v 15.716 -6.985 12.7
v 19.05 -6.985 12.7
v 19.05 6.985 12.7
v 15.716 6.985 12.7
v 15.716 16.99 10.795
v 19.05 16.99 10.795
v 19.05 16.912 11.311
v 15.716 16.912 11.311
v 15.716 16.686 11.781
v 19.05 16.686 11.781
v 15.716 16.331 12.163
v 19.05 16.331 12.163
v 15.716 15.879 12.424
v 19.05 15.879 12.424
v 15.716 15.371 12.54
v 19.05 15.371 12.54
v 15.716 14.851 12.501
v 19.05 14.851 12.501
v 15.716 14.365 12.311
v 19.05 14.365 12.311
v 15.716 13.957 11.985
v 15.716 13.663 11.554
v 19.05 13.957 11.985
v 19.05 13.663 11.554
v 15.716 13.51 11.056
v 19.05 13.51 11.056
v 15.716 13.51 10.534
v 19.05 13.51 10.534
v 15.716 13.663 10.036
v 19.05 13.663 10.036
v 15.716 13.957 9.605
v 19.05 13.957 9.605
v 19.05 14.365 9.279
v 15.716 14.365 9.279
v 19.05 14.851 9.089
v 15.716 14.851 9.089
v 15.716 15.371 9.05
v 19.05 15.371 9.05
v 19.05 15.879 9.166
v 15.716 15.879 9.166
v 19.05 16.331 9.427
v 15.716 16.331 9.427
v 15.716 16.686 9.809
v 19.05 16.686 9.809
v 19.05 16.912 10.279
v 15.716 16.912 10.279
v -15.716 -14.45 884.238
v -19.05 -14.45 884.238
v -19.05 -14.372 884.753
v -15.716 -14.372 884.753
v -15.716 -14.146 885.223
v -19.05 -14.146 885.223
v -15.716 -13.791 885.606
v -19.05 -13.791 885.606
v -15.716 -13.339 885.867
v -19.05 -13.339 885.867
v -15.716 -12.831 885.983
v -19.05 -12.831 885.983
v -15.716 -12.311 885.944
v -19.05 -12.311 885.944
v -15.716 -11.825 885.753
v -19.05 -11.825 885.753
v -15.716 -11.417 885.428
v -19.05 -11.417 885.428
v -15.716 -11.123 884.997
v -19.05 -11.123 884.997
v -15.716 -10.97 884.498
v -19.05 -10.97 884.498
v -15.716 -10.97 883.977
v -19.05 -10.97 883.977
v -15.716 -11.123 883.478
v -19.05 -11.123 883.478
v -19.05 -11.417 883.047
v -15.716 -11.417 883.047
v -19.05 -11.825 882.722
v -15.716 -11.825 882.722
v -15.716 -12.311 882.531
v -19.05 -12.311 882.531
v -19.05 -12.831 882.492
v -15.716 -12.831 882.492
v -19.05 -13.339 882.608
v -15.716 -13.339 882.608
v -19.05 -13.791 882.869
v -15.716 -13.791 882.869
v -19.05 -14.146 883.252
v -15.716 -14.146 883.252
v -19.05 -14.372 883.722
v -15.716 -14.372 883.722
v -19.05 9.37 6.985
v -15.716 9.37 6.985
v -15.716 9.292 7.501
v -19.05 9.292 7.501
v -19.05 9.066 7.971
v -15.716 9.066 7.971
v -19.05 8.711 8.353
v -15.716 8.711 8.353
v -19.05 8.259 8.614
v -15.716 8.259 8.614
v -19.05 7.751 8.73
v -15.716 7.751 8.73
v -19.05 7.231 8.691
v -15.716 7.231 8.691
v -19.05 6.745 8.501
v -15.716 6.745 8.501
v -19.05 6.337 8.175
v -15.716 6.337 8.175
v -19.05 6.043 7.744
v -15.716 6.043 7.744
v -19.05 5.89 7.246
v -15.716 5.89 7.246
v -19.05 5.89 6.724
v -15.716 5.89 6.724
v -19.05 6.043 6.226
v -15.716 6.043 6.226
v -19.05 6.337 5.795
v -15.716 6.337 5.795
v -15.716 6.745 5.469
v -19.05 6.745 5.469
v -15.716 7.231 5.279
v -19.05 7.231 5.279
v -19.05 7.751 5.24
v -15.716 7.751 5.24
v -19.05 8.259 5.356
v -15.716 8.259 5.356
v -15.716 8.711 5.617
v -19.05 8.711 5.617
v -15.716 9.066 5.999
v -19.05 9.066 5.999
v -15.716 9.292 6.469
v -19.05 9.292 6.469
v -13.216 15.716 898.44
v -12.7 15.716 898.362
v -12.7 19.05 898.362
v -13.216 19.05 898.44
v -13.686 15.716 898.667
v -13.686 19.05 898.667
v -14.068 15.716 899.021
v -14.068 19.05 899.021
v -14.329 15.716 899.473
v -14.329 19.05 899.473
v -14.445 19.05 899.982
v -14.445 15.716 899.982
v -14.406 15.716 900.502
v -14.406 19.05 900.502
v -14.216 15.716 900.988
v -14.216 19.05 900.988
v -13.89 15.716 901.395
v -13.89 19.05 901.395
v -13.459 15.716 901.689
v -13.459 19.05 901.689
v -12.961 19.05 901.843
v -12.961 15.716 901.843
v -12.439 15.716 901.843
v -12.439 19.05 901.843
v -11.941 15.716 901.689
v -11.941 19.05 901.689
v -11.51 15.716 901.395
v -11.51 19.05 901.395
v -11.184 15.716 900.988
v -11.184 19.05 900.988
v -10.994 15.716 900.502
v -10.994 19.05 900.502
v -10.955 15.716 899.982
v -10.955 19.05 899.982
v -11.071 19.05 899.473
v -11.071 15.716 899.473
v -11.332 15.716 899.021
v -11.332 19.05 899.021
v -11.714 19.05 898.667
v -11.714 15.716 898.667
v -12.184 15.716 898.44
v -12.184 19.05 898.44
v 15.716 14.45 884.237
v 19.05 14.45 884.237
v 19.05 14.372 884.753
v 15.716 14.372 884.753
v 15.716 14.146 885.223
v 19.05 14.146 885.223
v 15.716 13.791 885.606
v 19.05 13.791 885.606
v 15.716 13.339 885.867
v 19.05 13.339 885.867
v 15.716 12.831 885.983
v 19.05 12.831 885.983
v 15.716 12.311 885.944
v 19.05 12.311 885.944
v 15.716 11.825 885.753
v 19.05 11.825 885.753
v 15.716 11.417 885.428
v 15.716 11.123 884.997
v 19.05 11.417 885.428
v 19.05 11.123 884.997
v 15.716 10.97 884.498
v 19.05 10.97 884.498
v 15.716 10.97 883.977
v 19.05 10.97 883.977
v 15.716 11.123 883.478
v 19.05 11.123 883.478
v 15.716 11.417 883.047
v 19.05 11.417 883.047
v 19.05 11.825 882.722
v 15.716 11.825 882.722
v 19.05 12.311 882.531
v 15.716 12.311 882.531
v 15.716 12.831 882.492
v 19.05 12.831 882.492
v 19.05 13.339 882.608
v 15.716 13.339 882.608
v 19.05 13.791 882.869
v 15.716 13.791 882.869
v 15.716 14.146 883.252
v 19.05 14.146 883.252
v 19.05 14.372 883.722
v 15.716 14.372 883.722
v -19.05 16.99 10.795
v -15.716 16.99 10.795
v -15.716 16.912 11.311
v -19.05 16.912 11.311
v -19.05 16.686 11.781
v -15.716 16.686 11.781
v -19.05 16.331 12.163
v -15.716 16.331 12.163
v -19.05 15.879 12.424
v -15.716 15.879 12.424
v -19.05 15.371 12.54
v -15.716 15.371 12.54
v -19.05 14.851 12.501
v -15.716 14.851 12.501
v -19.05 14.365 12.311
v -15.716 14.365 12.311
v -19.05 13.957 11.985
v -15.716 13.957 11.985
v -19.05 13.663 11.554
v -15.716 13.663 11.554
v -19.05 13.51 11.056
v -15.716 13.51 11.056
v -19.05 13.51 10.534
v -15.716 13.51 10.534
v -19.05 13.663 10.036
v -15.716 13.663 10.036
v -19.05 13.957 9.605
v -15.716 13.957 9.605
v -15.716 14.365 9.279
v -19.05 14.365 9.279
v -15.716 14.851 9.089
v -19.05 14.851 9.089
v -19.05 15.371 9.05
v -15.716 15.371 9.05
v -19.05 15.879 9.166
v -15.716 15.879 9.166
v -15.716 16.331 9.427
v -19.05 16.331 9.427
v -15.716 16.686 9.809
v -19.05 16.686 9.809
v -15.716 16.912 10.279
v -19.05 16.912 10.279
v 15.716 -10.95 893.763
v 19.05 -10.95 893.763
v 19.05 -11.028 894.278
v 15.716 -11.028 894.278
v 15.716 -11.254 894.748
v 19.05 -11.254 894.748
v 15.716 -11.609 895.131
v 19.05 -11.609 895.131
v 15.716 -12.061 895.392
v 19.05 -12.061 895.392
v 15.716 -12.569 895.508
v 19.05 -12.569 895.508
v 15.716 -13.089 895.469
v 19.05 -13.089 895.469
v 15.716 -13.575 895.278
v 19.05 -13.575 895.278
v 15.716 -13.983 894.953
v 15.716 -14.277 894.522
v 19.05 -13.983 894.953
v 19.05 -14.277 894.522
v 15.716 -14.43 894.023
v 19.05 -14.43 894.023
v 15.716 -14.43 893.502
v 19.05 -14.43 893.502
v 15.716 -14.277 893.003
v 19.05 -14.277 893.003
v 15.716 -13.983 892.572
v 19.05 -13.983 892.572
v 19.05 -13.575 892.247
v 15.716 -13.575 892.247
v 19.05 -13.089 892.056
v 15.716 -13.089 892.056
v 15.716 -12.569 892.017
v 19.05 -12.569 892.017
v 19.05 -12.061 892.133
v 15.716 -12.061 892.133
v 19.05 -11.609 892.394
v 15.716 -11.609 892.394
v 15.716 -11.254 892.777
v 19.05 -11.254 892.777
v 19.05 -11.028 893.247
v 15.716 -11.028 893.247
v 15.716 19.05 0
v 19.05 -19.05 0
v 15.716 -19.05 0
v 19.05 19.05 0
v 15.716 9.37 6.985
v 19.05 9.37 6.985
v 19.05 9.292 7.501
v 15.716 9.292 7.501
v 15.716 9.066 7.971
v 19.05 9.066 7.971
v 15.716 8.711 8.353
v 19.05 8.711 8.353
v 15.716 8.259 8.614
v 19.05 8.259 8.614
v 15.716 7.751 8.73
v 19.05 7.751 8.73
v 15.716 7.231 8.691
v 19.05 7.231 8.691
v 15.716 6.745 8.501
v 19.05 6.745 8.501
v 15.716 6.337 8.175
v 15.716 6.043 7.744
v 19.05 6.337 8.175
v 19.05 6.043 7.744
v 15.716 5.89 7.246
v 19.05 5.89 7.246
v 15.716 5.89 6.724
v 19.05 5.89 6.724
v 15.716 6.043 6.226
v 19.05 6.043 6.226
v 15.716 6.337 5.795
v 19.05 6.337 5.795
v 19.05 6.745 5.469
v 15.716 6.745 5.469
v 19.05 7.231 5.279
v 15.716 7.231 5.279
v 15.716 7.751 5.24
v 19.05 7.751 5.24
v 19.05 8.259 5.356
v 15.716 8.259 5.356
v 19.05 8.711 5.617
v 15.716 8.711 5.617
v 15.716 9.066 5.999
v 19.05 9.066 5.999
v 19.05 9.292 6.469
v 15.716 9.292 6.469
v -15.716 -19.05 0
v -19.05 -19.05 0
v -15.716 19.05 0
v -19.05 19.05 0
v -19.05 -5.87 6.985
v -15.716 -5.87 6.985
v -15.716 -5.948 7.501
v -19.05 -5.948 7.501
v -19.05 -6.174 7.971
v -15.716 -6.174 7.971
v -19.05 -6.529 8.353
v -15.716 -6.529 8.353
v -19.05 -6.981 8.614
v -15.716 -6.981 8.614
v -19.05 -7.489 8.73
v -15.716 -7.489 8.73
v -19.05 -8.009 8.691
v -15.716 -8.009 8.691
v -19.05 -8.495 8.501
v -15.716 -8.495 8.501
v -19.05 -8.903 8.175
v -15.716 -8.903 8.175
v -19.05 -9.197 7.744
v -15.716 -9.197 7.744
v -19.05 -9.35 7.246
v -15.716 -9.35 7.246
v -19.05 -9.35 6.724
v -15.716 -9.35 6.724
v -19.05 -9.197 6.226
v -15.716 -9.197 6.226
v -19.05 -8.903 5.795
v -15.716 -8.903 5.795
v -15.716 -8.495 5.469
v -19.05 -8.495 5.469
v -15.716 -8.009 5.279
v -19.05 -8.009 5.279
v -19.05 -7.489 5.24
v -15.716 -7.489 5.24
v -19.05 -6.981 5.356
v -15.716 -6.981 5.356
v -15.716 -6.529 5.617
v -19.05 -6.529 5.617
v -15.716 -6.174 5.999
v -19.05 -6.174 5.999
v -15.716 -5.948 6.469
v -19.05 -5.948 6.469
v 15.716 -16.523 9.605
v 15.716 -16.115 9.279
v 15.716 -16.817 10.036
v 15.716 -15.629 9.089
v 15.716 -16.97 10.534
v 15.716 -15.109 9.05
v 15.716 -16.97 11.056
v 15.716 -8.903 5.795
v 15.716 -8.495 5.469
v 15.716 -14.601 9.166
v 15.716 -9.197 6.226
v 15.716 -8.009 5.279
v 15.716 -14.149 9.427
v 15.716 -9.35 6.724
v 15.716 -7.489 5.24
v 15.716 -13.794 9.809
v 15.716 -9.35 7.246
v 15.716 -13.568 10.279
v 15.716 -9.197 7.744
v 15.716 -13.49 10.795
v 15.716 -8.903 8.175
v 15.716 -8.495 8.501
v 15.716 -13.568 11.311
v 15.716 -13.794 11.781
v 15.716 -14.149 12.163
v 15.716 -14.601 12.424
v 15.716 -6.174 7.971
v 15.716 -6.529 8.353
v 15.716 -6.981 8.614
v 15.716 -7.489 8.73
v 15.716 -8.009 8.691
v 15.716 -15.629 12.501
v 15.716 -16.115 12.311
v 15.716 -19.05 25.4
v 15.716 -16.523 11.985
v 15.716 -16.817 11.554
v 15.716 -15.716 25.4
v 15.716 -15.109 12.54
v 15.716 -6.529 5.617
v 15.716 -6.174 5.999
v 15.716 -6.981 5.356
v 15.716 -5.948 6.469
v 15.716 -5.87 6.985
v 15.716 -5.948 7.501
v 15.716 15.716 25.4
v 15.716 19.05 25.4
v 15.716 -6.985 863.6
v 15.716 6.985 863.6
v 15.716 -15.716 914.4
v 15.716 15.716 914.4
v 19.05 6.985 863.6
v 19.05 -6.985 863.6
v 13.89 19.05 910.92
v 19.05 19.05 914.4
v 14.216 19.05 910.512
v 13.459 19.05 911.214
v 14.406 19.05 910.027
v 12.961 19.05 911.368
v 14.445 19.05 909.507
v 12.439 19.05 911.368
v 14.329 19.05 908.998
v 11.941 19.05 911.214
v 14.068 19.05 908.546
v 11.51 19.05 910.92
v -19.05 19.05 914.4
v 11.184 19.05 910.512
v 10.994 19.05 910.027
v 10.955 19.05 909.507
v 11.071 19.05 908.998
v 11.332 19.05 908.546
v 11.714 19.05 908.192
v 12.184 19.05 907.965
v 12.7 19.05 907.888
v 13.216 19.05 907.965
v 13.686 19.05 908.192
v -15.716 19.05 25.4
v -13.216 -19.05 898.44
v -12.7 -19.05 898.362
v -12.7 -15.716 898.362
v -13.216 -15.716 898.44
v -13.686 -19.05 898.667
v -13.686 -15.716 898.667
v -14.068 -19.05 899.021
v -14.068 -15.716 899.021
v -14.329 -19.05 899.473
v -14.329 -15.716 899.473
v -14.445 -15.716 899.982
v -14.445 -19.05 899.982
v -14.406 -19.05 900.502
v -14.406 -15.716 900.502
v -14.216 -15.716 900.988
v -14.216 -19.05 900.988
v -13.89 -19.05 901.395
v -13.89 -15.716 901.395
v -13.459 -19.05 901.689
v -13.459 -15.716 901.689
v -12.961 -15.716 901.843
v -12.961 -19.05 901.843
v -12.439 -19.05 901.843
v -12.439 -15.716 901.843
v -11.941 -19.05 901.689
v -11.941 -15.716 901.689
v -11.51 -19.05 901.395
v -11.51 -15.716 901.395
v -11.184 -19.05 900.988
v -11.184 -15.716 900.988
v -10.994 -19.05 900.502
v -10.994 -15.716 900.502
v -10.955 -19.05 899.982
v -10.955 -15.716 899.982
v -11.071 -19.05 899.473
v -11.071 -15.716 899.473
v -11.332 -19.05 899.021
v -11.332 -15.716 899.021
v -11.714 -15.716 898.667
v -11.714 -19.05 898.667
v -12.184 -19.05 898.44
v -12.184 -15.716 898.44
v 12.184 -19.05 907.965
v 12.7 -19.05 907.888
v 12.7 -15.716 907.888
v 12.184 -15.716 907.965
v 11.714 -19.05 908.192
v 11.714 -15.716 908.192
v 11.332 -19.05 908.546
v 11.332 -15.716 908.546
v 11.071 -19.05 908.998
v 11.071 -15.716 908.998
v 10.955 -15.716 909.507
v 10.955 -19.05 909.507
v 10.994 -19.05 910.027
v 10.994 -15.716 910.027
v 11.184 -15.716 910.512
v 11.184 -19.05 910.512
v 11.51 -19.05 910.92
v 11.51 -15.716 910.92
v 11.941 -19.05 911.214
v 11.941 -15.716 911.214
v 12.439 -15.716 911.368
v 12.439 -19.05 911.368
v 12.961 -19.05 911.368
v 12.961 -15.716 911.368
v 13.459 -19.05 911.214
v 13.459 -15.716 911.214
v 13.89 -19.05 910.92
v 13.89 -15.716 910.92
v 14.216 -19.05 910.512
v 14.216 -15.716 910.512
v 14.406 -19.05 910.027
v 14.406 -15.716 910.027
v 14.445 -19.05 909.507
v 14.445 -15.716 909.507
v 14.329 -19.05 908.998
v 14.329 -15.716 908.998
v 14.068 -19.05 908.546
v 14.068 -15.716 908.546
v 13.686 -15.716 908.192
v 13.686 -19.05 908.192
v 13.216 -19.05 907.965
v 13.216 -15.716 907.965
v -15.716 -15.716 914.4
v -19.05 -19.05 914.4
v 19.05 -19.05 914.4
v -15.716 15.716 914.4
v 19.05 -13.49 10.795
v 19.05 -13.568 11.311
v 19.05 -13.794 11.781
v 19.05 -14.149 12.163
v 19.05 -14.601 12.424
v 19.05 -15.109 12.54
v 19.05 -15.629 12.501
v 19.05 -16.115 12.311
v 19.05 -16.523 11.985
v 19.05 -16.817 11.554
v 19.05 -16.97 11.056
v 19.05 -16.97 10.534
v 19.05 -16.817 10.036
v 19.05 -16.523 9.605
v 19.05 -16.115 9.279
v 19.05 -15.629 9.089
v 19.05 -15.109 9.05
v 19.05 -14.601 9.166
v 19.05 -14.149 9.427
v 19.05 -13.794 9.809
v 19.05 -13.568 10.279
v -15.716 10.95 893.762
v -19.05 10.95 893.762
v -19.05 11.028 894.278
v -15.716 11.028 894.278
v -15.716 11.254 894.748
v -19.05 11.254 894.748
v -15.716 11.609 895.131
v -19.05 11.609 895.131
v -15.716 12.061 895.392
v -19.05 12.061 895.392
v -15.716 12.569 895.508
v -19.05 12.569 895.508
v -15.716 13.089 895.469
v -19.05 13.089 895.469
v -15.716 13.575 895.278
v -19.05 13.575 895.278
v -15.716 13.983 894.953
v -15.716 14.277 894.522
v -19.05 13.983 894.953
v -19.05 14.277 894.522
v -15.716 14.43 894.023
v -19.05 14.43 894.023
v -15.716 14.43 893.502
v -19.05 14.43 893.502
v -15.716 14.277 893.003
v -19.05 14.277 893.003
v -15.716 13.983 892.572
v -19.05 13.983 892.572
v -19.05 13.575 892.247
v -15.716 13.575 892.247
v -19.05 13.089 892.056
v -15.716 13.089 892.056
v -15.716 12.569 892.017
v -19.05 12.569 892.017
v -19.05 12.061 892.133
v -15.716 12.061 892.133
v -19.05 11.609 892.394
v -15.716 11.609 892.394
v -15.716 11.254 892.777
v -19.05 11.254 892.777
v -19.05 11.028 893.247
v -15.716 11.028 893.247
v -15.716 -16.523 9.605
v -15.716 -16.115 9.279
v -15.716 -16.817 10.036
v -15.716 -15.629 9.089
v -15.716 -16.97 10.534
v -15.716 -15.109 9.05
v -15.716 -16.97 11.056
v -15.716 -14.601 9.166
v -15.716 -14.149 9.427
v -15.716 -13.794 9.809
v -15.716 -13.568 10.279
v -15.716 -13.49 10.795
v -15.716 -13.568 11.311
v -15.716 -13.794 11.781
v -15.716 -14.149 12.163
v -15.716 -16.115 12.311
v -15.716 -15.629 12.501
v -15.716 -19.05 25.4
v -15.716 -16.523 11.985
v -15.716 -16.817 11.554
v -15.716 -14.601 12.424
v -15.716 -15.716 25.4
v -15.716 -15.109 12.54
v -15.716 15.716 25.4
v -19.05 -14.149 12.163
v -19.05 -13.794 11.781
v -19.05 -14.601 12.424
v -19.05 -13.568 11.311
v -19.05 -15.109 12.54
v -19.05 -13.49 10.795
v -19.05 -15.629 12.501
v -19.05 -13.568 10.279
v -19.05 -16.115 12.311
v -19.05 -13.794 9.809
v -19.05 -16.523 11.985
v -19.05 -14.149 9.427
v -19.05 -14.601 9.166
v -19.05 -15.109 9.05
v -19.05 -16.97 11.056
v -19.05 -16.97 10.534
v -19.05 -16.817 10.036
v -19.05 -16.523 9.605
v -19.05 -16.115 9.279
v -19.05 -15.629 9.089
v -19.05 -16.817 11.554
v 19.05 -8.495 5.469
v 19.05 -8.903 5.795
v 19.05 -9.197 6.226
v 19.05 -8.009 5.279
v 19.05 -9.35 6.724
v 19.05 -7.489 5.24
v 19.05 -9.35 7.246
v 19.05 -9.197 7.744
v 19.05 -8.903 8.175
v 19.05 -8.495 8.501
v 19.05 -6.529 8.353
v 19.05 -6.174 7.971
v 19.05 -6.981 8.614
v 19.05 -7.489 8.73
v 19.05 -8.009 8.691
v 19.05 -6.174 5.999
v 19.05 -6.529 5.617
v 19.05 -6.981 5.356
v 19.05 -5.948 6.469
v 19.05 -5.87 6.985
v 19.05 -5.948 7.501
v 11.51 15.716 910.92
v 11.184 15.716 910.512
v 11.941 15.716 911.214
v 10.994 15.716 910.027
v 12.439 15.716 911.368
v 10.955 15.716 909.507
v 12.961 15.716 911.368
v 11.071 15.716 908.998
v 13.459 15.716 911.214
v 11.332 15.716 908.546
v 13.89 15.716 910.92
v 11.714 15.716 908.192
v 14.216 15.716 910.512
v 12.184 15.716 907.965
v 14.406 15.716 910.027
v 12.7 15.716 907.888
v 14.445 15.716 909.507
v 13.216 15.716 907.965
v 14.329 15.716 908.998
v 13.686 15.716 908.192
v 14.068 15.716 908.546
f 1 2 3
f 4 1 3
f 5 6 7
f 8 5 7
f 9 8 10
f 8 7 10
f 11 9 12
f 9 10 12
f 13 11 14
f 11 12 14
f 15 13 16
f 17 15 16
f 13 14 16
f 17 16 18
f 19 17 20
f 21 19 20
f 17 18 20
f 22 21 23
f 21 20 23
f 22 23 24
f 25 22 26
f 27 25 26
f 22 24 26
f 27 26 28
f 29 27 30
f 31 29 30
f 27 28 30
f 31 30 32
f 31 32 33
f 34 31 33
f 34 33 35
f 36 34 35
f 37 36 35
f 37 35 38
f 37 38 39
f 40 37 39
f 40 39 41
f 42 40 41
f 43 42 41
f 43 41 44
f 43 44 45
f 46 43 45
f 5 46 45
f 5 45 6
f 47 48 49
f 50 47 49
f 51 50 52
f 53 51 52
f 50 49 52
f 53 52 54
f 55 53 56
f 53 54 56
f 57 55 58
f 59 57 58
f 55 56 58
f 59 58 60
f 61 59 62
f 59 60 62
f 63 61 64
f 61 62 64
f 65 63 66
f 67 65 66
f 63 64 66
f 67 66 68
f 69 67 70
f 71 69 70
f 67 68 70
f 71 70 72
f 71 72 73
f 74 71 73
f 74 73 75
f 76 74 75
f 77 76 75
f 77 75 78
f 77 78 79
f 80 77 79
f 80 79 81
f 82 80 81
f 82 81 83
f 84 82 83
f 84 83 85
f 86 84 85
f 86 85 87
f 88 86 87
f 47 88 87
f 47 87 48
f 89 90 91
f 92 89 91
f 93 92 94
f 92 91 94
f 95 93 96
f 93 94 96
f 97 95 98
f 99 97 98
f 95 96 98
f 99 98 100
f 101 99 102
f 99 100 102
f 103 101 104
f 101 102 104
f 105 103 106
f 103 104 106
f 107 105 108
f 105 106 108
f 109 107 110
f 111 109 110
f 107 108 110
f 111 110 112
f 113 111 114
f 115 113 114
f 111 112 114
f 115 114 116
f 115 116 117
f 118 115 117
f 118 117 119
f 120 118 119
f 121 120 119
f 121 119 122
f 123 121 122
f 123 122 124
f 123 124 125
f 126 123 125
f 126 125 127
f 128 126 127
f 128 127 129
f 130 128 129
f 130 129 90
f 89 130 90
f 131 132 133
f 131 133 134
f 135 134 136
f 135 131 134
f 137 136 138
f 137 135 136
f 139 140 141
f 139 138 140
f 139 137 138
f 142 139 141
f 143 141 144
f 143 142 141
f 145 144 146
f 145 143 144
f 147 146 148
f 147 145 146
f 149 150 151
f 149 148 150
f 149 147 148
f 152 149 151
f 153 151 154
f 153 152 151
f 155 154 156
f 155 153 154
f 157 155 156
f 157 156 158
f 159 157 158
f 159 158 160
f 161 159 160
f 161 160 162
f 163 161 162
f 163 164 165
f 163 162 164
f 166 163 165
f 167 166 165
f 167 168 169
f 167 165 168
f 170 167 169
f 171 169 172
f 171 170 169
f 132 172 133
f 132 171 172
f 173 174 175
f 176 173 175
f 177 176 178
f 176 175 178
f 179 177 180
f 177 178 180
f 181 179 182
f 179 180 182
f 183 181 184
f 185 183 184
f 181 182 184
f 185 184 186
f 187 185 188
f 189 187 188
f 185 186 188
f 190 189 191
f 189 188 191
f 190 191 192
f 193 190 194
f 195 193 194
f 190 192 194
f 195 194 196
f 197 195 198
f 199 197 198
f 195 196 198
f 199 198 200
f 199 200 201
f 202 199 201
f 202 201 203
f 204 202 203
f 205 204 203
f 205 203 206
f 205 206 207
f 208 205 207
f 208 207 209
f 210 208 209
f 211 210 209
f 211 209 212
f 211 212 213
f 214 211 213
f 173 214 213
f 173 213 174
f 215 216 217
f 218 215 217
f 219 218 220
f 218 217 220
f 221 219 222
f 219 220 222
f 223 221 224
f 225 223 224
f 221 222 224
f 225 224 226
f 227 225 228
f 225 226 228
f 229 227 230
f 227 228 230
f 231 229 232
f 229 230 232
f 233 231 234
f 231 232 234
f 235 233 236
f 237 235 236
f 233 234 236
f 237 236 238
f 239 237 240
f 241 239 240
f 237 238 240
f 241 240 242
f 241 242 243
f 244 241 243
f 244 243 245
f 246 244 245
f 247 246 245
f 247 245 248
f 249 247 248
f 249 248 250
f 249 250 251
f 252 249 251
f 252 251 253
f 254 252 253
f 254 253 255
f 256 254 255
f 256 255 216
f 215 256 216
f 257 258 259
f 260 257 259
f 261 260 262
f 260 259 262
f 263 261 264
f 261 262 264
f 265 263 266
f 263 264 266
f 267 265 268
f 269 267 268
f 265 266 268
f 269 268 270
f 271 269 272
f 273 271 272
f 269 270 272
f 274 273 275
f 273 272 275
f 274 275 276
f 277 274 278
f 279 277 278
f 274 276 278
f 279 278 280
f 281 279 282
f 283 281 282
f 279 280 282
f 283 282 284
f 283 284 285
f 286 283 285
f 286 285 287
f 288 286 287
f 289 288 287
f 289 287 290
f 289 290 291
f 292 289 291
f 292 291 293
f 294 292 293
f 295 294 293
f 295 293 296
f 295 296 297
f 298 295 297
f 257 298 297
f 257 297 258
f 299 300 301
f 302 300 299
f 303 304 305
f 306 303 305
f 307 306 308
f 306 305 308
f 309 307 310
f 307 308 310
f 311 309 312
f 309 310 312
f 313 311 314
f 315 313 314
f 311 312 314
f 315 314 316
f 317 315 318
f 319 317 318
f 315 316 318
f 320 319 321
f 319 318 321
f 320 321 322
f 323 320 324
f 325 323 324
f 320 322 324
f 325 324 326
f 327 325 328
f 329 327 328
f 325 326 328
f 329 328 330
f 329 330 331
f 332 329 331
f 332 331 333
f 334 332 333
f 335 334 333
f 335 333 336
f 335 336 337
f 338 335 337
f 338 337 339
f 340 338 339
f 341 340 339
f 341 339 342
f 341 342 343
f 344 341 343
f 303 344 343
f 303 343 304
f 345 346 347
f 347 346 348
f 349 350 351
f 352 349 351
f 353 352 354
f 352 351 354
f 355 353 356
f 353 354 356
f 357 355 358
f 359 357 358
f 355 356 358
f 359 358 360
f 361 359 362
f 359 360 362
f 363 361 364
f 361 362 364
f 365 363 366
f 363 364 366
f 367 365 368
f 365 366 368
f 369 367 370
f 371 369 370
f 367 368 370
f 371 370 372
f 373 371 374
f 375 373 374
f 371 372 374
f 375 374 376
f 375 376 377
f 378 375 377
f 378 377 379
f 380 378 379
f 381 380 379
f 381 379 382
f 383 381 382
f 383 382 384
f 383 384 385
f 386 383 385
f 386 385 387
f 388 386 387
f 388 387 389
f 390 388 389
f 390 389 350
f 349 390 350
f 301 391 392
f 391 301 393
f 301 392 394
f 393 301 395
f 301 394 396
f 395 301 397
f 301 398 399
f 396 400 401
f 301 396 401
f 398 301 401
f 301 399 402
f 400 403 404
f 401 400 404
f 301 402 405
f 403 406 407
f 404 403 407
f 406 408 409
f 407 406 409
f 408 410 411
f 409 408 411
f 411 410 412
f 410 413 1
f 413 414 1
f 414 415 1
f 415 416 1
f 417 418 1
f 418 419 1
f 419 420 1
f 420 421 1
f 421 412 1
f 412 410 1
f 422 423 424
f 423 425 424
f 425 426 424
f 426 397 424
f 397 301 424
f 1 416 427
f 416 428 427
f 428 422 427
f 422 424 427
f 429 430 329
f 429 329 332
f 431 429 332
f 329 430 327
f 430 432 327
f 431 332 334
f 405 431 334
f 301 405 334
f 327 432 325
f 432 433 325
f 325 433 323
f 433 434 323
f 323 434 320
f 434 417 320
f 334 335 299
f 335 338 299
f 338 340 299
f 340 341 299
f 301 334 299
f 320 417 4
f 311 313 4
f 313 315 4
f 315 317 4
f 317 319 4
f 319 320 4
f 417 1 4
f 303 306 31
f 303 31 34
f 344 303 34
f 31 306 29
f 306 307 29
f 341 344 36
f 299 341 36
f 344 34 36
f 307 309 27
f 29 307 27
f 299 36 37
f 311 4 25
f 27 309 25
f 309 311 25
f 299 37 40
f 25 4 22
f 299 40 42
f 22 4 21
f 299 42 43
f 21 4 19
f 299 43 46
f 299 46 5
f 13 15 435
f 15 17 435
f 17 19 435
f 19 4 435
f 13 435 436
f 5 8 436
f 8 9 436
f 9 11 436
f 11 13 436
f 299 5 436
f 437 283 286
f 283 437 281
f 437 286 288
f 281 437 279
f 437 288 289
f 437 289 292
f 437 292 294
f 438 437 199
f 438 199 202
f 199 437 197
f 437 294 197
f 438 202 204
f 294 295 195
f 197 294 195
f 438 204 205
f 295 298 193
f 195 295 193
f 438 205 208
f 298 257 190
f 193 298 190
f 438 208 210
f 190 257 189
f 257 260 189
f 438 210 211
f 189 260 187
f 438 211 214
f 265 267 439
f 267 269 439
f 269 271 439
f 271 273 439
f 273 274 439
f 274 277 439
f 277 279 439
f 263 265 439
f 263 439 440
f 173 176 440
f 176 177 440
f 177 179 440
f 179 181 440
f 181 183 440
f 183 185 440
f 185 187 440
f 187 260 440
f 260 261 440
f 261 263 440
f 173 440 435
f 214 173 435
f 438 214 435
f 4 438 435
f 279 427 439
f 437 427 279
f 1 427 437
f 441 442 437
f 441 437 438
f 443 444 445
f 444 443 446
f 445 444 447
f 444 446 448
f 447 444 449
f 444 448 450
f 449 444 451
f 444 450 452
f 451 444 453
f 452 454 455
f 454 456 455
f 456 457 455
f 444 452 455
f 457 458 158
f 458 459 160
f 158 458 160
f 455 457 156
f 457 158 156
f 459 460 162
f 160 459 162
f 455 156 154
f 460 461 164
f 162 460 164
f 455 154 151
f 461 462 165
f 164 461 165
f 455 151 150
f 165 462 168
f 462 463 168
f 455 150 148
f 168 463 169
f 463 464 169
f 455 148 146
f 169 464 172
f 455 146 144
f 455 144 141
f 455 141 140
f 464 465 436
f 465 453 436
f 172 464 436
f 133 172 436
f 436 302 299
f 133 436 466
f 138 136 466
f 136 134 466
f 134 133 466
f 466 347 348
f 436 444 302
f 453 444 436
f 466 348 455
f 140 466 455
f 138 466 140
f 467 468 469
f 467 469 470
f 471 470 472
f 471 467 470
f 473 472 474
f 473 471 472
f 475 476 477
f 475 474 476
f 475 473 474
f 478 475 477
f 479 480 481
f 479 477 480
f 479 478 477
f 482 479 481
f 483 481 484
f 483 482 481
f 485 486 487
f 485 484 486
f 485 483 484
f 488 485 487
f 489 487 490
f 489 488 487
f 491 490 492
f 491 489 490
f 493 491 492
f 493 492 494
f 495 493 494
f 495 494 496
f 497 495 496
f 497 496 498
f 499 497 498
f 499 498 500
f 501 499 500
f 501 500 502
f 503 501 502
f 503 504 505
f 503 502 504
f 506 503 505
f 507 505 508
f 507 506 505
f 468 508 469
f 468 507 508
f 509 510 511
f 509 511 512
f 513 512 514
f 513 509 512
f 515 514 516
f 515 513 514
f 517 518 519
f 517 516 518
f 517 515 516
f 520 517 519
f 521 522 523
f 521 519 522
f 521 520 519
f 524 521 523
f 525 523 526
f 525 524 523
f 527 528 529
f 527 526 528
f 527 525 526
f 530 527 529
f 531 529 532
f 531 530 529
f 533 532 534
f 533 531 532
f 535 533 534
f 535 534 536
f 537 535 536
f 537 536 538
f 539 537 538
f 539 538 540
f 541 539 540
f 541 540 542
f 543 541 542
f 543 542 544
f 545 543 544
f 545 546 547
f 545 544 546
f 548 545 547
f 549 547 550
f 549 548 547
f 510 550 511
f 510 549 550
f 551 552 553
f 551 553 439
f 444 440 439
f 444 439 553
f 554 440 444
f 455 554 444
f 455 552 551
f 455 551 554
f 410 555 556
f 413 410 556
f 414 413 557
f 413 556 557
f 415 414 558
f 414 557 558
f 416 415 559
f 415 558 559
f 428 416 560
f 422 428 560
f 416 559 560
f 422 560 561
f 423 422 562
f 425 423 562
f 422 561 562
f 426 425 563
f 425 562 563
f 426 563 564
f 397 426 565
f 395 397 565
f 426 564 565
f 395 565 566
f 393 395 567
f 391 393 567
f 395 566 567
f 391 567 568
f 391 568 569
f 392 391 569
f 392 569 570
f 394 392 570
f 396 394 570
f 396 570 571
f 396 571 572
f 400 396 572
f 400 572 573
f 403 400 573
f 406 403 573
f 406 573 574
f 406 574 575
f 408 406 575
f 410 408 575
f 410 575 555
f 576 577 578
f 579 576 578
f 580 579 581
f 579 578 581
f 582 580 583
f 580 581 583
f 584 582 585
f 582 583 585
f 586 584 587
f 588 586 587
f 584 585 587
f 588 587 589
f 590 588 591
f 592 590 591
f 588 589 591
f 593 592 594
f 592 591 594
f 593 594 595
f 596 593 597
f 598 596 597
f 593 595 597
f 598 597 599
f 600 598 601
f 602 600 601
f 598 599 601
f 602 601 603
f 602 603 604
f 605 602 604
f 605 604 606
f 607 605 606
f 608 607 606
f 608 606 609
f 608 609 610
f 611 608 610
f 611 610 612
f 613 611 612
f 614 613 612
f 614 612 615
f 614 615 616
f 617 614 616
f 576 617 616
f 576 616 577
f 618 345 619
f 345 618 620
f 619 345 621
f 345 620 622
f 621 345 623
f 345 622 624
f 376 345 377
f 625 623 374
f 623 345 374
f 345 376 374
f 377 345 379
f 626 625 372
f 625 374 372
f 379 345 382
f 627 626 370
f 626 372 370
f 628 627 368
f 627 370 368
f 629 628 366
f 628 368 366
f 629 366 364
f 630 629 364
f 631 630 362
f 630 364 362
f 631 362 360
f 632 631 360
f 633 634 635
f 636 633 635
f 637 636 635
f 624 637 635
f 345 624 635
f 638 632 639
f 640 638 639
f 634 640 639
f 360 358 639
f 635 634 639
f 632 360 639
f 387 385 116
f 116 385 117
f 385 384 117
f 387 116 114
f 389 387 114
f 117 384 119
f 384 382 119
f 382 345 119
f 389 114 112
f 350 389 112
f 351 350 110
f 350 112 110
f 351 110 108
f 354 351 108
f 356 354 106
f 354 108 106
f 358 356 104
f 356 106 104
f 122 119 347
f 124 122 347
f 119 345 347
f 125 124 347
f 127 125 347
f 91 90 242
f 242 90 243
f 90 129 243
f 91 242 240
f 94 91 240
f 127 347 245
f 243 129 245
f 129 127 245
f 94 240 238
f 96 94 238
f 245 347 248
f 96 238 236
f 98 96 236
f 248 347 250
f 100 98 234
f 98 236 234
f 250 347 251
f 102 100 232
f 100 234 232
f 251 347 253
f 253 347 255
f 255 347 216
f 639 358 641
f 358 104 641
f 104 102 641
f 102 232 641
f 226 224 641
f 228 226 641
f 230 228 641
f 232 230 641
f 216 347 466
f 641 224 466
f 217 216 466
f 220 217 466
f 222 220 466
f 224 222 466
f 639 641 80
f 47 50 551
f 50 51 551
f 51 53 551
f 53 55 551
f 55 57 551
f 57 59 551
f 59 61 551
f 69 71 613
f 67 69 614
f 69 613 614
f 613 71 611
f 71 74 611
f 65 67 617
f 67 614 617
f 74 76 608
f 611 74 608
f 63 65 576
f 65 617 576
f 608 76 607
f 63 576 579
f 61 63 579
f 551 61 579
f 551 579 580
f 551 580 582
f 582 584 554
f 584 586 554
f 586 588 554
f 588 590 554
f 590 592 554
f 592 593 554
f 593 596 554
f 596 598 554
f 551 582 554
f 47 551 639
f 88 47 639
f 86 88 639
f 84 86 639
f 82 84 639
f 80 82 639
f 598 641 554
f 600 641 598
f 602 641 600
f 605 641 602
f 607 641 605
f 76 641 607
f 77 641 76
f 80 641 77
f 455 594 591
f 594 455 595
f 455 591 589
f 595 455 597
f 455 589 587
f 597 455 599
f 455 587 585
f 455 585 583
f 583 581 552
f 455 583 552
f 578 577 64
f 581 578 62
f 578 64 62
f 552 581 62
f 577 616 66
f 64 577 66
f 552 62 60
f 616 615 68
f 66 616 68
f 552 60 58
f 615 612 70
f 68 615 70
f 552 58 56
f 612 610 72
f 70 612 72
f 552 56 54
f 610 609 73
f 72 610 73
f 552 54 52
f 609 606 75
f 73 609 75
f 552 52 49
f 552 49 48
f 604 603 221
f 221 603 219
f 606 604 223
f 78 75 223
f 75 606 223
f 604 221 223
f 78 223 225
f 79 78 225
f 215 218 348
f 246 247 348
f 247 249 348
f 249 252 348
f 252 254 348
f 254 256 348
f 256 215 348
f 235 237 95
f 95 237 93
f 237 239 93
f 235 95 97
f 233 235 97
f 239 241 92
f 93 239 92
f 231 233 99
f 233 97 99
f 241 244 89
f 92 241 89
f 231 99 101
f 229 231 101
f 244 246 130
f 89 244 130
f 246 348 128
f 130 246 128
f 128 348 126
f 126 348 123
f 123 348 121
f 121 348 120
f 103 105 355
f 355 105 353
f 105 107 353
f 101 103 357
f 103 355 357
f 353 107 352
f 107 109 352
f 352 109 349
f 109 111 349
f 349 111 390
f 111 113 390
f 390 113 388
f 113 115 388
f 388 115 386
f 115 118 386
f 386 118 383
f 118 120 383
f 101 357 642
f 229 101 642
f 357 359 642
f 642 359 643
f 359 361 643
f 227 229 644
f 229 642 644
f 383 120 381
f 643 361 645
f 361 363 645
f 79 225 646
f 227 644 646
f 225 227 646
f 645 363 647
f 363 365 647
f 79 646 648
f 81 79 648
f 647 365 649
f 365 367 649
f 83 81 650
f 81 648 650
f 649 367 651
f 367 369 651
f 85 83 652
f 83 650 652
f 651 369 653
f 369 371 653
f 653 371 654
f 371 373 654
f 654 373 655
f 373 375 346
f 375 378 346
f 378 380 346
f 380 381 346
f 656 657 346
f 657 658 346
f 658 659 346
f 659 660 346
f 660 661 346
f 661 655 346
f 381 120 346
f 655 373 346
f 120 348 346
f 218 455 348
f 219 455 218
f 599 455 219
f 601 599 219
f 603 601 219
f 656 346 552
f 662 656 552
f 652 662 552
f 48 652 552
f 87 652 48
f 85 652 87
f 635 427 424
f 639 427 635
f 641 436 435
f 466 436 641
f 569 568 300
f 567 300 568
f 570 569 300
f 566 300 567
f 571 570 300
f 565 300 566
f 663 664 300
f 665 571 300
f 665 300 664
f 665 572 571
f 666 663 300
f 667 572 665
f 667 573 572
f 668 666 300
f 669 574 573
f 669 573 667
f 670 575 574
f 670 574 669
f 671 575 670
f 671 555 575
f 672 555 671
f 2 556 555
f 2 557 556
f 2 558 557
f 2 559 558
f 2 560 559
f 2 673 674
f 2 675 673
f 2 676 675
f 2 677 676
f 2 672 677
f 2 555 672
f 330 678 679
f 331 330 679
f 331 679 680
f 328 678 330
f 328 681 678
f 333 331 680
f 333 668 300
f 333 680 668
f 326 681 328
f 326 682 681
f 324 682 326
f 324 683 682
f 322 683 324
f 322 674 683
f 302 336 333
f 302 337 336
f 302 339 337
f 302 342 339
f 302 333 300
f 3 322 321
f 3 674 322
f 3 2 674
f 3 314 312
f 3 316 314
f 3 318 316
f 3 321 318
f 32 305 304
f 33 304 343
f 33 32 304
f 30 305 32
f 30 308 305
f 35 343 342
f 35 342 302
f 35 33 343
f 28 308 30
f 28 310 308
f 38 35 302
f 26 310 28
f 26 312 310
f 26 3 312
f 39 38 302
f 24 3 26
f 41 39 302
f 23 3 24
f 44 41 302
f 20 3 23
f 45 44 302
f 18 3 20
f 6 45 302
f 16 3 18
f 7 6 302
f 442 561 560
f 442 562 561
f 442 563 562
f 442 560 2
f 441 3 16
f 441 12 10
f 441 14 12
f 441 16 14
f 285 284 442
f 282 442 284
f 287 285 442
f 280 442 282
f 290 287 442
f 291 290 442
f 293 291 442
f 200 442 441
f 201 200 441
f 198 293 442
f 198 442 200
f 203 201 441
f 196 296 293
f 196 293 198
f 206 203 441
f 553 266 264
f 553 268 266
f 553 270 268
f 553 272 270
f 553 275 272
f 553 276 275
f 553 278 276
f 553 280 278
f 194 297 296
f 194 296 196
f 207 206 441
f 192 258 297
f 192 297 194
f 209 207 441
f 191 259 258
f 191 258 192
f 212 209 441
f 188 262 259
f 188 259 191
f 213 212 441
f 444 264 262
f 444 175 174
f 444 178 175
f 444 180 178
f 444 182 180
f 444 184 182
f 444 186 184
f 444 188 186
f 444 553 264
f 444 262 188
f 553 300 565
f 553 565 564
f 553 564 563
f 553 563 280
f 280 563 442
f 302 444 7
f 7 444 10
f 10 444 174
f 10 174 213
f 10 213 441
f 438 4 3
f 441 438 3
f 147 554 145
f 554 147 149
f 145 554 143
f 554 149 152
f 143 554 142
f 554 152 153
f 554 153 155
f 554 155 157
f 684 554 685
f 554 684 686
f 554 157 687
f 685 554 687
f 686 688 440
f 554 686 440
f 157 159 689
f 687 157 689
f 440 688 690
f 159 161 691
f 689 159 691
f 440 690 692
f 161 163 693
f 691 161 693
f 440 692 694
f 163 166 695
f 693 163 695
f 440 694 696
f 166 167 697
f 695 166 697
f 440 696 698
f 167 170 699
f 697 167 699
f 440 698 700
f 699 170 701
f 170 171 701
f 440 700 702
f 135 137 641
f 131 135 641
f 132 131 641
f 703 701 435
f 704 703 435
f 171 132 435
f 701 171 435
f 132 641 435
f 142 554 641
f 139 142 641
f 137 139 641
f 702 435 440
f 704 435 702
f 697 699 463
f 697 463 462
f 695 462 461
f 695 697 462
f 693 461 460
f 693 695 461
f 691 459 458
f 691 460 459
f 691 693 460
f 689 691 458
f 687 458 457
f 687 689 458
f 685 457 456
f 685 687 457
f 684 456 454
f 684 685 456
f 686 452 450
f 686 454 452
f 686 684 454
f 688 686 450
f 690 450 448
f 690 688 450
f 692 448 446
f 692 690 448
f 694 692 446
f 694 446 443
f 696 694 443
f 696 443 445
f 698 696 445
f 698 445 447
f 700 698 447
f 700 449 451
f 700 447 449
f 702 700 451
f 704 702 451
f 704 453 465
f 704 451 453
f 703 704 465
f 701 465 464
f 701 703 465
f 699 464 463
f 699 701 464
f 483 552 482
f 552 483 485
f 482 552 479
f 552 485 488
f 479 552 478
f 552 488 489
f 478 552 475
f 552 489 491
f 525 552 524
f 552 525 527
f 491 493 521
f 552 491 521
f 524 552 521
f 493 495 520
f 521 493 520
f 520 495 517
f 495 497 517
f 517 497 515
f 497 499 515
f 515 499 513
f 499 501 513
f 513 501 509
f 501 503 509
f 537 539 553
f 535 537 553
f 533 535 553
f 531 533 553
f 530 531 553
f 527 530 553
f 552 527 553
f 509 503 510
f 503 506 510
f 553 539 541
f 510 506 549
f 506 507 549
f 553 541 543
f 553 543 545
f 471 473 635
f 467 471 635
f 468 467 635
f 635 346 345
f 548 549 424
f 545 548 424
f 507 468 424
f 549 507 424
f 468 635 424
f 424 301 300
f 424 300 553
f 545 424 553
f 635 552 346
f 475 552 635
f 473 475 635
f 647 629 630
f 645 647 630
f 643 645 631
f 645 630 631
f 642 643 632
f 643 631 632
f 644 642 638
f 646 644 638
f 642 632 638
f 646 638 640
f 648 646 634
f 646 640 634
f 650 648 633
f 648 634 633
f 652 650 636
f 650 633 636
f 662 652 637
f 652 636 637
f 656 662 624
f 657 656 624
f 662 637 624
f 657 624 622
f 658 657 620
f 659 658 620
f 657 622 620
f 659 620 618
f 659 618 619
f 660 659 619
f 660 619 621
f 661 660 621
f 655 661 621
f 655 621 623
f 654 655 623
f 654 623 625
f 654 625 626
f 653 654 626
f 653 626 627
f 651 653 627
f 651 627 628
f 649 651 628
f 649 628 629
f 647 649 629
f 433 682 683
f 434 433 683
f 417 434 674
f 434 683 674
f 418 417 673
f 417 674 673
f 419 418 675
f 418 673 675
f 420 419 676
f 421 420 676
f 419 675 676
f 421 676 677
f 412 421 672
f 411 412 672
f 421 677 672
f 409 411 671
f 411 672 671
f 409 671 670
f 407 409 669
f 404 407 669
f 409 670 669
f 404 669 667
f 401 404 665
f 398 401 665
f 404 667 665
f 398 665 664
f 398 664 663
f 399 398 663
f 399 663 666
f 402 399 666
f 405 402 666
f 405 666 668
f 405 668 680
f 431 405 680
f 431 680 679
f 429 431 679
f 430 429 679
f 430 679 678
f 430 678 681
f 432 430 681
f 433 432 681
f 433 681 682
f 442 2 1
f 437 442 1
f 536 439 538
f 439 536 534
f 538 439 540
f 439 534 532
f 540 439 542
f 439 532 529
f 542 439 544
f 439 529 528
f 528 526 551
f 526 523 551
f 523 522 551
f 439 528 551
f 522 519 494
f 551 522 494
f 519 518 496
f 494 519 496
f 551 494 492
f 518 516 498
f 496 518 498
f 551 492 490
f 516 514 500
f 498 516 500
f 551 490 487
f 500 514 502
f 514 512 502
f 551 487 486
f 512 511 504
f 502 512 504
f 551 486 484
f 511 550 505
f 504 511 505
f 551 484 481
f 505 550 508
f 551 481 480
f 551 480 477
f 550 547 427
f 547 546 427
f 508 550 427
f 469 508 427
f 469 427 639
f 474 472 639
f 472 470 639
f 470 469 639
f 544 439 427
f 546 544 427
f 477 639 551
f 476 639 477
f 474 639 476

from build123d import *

# Parameters (mm, degrees)
BOSS_EXTRUDE1_DEPTH     = 914.4
CUT_EXTRUDE2_DEPTH      = 70.104
CUT_EXTRUDE2_DEPTH_BACK = 58.42
SKETCH7_R               = 1.75
SKETCH8_W               = 31.4325
SKETCH8_H               = 50.8
CUT_EXTRUDE3_DEPTH      = 71.882
SKETCH10_R              = 1.75
CUT_EXTRUDE5_DEPTH      = 12.7
SKETCH11_W              = 13.97
SKETCH11_H              = 12.7
BOSS_EXTRUDE2_DEPTH     = 3.33375
SKETCH9_R               = 1.75
CUT_EXTRUDE4_DEPTH      = 68.326
CIRPATTERN1_COUNT       = 2
SKETCH12_W              = 38.1
SKETCH12_H              = 50.8
SKETCH12_R              = 1.75
BOSS_EXTRUDE3_DEPTH     = 3.33375


with BuildPart() as part:
    # Sketch1 → Boss-Extrude1 (new body)
    with BuildSketch(Plane(origin=(0, 0, 0), x_dir=(0, 1, 0), z_dir=(0, 0, 1))):
        Polygon((6.985, -19.05), (19.05, -19.05), (19.05, 19.05), (-19.05, 19.05), (-19.05, -19.05), (-6.985, -19.05), (-6.985, -15.71625), (-15.71625, -15.71625), (-15.71625, 15.71625), (15.71625, 15.71625), (15.71625, -15.71625), (6.985, -15.71625), align=None)
    extrude(amount=BOSS_EXTRUDE1_DEPTH)

    # Sketch7 → Cut-Extrude2 (cut, two sides: drawn at the far end of the back side and taken through both)
    with BuildSketch(Plane(origin=(0, 0, 0), x_dir=(-1, 0, 0), z_dir=(0, 1, 0)).offset(-CUT_EXTRUDE2_DEPTH_BACK)):
        with Locations(Location((-12.7, 909.6375, 0), (0, 0, 270))):
            Circle(SKETCH7_R)
        with Locations(Location((12.7, 900.1125, 0), (0, 0, 270))):
            Circle(SKETCH7_R)
    extrude(amount=CUT_EXTRUDE2_DEPTH + CUT_EXTRUDE2_DEPTH_BACK, mode=Mode.SUBTRACT)

    # Sketch8 → Cut-Extrude3 (cut)
    with BuildSketch(Plane(origin=(0, 19.05, 0), x_dir=(-1, 0, 0), z_dir=(0, 1, 0))):
        Rectangle(SKETCH8_W, SKETCH8_H)
    extrude(amount=-CUT_EXTRUDE3_DEPTH, mode=Mode.SUBTRACT)

    # Sketch10 → Cut-Extrude5 (cut)
    with BuildSketch(Plane.YZ.offset(19.05)):
        with Locations((-12.7, 893.7625)):
            Circle(SKETCH10_R)
        with Locations((12.7, 884.2375)):
            Circle(SKETCH10_R)
    cut_extrude5 = extrude(amount=-CUT_EXTRUDE5_DEPTH, mode=Mode.SUBTRACT)

    # Sketch11 → Boss-Extrude2 (add)
    with BuildSketch(Plane.YZ.offset(19.05)):
        with Locations((0, 6.35)):
            Rectangle(SKETCH11_W, SKETCH11_H)
    extrude(amount=-BOSS_EXTRUDE2_DEPTH)

    # Sketch9 → Cut-Extrude4 (cut)
    with BuildSketch(Plane.YZ.offset(19.05)):
        with Locations((-15.24, 10.795)):
            Circle(SKETCH9_R)
        with Locations((15.24, 10.795)):
            Circle(SKETCH9_R)
        with Locations((7.62, 6.985)):
            Circle(SKETCH9_R)
        with Locations((-7.62, 6.985)):
            Circle(SKETCH9_R)
    extrude(amount=-CUT_EXTRUDE4_DEPTH, mode=Mode.SUBTRACT)

    # CirPattern1: Cut-Extrude5 ×2 about axis
    cirpattern1_axis = Axis((0, 0, 746.76), (0, 0, -1))
    for i in range(1, CIRPATTERN1_COUNT):
        add(cut_extrude5.rotate(cirpattern1_axis, i * 360 / CIRPATTERN1_COUNT), mode=Mode.SUBTRACT)

    # Sketch12 → Boss-Extrude3 (add)
    with BuildSketch(Plane.YZ.offset(19.05)):
        with Locations((0, 889)):
            Rectangle(SKETCH12_W, SKETCH12_H)
        with Locations((12.7, 884.2375)):
            Circle(SKETCH12_R, mode=Mode.SUBTRACT)
        with Locations((-12.7, 893.7625)):
            Circle(SKETCH12_R, mode=Mode.SUBTRACT)
    extrude(amount=-BOSS_EXTRUDE3_DEPTH)


solid = part.part
